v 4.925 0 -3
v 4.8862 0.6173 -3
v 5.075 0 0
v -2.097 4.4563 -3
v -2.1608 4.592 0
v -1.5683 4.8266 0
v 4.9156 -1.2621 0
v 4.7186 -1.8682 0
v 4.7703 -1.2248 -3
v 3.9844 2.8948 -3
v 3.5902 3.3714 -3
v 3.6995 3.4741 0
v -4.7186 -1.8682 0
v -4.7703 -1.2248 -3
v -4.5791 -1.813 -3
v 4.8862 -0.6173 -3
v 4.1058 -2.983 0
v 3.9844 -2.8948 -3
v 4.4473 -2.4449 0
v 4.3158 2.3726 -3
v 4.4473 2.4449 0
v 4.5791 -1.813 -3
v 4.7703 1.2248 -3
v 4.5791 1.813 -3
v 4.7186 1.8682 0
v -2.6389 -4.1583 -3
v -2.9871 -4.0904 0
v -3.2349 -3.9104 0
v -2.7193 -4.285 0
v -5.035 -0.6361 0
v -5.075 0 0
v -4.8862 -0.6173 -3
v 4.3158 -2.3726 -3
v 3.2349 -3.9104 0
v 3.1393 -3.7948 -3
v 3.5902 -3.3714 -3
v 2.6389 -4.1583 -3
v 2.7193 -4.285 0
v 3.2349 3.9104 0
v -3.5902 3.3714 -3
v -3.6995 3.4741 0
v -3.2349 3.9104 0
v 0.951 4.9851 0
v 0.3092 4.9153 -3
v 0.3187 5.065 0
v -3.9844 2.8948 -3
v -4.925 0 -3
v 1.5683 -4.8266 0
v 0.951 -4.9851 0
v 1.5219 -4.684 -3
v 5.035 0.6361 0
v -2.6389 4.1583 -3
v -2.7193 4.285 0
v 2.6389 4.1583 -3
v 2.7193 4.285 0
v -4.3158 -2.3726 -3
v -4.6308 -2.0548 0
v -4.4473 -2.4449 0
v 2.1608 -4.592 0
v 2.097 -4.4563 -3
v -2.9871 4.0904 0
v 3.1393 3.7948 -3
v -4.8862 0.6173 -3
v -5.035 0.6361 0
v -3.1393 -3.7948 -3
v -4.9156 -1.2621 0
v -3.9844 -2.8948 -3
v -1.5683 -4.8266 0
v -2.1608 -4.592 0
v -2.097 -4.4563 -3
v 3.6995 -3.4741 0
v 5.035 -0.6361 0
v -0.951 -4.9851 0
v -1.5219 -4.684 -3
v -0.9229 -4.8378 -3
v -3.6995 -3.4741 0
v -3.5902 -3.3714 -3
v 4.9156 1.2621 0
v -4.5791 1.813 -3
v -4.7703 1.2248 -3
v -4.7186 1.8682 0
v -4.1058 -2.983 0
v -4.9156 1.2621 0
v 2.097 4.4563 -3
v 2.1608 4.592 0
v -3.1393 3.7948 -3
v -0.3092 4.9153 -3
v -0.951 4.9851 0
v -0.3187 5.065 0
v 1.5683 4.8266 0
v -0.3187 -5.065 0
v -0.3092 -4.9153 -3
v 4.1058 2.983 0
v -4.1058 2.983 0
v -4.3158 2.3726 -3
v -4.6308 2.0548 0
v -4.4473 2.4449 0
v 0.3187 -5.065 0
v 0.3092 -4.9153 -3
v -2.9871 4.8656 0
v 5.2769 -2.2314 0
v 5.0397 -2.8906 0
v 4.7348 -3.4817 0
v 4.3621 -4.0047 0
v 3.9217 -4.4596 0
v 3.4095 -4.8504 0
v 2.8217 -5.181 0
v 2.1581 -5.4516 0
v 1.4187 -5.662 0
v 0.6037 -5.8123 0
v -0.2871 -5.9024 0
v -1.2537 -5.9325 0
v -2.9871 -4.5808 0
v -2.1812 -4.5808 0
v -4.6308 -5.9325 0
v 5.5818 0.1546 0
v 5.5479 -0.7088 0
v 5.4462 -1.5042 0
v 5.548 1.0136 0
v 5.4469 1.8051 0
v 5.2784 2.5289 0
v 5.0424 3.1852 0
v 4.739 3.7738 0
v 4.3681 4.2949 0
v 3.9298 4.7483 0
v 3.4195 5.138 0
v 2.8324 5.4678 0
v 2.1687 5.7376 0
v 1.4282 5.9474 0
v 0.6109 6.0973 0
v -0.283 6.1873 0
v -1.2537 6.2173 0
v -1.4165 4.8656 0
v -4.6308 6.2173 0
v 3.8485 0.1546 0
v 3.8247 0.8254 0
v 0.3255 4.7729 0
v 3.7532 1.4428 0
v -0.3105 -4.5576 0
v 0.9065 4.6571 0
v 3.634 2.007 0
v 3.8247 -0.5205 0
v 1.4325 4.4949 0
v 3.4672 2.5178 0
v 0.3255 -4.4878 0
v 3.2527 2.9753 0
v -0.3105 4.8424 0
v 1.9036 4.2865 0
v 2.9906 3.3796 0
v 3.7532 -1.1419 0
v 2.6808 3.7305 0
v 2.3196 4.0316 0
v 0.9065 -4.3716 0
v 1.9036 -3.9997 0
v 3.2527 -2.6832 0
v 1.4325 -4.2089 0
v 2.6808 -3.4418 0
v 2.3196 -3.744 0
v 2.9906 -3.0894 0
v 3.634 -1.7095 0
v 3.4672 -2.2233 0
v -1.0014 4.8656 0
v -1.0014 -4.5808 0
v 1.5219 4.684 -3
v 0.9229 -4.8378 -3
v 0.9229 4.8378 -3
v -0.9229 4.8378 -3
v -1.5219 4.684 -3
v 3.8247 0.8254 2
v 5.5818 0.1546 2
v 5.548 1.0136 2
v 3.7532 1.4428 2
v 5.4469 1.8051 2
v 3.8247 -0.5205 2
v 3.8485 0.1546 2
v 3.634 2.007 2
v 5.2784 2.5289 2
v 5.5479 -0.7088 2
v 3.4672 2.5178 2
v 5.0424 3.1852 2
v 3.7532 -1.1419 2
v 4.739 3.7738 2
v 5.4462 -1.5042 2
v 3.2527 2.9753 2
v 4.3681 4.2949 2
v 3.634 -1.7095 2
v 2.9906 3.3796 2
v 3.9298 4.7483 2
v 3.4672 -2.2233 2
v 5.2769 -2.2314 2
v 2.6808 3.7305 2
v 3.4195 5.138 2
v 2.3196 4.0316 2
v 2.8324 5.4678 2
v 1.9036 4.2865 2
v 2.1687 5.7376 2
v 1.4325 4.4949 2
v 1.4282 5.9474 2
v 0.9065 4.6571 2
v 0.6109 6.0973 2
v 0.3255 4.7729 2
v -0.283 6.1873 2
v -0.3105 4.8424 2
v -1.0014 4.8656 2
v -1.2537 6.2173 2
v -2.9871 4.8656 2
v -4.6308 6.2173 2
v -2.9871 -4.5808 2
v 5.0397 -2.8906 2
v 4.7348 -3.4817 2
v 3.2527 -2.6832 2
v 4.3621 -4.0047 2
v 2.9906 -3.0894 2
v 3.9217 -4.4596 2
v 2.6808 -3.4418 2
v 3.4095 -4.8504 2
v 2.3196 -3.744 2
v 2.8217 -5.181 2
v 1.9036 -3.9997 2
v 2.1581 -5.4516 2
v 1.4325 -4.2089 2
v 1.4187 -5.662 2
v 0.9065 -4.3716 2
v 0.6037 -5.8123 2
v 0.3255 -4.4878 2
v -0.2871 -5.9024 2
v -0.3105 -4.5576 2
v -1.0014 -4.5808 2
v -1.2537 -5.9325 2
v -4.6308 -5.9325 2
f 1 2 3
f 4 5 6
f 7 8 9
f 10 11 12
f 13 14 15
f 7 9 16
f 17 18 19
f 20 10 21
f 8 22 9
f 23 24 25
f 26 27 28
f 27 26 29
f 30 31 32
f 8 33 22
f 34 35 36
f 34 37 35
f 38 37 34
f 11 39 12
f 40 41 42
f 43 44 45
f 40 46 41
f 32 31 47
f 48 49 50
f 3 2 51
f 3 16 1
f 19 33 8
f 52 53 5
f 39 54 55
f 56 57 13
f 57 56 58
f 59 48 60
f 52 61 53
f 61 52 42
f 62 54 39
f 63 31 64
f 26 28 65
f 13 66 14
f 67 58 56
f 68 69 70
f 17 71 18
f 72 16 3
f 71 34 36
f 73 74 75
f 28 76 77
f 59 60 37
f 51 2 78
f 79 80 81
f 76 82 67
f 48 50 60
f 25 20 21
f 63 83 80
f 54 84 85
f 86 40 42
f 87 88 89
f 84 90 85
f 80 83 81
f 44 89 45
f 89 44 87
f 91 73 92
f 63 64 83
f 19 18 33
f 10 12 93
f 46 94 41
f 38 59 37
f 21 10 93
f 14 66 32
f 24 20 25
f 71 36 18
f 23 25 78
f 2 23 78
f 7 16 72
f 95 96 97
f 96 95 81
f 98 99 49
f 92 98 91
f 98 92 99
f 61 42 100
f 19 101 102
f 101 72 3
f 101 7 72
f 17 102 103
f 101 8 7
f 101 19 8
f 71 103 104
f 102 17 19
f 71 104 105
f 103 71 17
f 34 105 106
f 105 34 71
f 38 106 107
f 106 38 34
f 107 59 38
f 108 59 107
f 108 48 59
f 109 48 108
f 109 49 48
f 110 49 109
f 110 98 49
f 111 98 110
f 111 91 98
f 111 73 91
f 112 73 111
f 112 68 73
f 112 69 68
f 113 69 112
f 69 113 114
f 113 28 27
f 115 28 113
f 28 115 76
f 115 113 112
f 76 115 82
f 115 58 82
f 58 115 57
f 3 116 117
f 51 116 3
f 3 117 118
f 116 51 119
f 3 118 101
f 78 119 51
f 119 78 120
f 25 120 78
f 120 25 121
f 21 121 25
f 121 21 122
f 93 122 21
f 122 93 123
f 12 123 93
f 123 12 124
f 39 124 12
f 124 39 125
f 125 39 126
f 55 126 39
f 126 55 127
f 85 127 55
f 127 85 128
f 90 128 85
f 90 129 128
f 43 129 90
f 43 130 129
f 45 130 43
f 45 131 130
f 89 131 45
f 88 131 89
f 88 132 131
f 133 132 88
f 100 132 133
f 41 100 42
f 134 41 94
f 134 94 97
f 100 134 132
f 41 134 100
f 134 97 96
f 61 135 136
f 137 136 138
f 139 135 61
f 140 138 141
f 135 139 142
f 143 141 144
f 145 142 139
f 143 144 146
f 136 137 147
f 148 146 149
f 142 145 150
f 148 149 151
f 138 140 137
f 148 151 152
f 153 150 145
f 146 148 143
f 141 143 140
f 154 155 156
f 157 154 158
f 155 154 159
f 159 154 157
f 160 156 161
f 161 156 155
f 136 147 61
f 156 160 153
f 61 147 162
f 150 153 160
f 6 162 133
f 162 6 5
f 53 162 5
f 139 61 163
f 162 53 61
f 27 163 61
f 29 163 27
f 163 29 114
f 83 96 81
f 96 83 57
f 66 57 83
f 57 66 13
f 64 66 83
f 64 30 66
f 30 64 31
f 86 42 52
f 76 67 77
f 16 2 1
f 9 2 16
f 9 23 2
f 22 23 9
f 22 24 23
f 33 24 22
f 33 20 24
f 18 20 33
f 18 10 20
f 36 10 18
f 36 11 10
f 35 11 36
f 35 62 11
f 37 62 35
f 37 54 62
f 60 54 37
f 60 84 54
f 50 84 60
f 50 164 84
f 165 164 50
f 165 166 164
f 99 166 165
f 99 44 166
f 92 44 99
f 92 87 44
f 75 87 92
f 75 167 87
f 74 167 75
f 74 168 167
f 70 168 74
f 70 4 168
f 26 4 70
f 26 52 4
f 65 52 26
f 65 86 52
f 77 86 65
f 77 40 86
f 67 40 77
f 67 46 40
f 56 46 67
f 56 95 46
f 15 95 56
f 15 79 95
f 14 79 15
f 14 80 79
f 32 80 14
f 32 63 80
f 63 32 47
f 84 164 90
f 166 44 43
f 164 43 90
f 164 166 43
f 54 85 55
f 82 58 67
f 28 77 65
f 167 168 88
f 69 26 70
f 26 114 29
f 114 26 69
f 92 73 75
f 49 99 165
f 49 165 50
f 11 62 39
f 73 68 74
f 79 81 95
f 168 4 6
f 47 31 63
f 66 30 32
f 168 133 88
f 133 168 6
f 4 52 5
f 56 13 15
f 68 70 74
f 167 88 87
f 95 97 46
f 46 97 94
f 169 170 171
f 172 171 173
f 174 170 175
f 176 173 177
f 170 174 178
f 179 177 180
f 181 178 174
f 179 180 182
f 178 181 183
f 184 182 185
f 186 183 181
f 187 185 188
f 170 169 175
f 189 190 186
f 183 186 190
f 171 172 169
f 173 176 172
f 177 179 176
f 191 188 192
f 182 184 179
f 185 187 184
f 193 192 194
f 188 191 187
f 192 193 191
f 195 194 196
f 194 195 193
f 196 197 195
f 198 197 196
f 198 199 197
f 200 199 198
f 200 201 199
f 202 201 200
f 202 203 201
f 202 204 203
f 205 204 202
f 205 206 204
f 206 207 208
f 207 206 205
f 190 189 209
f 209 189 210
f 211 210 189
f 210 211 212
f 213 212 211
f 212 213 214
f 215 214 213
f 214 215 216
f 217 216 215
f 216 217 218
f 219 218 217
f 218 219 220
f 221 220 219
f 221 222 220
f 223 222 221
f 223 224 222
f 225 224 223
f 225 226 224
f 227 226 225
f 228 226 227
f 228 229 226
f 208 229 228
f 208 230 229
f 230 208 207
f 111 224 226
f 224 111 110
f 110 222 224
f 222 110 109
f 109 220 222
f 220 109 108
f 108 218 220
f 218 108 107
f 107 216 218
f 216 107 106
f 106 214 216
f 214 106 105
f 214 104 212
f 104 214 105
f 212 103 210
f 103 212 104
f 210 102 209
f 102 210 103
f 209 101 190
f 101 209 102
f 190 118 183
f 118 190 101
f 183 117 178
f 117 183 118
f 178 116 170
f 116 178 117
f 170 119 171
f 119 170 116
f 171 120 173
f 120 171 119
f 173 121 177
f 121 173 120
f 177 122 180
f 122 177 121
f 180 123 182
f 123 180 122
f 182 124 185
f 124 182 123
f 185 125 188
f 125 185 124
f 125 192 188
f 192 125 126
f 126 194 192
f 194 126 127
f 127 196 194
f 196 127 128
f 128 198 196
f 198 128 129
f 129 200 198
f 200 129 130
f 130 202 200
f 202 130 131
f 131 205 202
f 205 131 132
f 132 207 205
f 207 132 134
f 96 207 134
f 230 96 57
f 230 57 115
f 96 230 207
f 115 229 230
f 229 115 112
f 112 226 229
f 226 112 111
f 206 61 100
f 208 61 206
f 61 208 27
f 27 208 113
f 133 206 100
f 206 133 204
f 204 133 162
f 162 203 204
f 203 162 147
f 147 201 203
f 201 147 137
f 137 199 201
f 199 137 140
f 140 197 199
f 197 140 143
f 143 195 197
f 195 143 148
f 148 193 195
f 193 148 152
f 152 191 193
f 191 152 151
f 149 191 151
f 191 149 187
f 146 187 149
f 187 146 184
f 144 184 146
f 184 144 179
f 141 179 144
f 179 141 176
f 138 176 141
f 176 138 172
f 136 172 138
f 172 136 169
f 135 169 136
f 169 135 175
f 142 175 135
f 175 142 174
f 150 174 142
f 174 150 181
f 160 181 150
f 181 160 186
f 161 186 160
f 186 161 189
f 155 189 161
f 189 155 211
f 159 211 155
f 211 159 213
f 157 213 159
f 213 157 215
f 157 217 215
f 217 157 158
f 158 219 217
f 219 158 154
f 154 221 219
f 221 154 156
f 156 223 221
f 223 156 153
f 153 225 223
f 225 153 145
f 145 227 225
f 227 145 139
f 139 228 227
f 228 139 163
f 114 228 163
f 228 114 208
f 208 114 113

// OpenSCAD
$fn = 50;

difference() {
	union() {
		translate(v = [0, 0, -3.0]) {
			cylinder(h = 3, r1 = 4.925, r2 = 5.075);
		}
		linear_extrude(height = 2) {
			text(font = "Impact", halign = "center", size = 12, text = "D", valign = "center");
		}
	}
	union();
}
